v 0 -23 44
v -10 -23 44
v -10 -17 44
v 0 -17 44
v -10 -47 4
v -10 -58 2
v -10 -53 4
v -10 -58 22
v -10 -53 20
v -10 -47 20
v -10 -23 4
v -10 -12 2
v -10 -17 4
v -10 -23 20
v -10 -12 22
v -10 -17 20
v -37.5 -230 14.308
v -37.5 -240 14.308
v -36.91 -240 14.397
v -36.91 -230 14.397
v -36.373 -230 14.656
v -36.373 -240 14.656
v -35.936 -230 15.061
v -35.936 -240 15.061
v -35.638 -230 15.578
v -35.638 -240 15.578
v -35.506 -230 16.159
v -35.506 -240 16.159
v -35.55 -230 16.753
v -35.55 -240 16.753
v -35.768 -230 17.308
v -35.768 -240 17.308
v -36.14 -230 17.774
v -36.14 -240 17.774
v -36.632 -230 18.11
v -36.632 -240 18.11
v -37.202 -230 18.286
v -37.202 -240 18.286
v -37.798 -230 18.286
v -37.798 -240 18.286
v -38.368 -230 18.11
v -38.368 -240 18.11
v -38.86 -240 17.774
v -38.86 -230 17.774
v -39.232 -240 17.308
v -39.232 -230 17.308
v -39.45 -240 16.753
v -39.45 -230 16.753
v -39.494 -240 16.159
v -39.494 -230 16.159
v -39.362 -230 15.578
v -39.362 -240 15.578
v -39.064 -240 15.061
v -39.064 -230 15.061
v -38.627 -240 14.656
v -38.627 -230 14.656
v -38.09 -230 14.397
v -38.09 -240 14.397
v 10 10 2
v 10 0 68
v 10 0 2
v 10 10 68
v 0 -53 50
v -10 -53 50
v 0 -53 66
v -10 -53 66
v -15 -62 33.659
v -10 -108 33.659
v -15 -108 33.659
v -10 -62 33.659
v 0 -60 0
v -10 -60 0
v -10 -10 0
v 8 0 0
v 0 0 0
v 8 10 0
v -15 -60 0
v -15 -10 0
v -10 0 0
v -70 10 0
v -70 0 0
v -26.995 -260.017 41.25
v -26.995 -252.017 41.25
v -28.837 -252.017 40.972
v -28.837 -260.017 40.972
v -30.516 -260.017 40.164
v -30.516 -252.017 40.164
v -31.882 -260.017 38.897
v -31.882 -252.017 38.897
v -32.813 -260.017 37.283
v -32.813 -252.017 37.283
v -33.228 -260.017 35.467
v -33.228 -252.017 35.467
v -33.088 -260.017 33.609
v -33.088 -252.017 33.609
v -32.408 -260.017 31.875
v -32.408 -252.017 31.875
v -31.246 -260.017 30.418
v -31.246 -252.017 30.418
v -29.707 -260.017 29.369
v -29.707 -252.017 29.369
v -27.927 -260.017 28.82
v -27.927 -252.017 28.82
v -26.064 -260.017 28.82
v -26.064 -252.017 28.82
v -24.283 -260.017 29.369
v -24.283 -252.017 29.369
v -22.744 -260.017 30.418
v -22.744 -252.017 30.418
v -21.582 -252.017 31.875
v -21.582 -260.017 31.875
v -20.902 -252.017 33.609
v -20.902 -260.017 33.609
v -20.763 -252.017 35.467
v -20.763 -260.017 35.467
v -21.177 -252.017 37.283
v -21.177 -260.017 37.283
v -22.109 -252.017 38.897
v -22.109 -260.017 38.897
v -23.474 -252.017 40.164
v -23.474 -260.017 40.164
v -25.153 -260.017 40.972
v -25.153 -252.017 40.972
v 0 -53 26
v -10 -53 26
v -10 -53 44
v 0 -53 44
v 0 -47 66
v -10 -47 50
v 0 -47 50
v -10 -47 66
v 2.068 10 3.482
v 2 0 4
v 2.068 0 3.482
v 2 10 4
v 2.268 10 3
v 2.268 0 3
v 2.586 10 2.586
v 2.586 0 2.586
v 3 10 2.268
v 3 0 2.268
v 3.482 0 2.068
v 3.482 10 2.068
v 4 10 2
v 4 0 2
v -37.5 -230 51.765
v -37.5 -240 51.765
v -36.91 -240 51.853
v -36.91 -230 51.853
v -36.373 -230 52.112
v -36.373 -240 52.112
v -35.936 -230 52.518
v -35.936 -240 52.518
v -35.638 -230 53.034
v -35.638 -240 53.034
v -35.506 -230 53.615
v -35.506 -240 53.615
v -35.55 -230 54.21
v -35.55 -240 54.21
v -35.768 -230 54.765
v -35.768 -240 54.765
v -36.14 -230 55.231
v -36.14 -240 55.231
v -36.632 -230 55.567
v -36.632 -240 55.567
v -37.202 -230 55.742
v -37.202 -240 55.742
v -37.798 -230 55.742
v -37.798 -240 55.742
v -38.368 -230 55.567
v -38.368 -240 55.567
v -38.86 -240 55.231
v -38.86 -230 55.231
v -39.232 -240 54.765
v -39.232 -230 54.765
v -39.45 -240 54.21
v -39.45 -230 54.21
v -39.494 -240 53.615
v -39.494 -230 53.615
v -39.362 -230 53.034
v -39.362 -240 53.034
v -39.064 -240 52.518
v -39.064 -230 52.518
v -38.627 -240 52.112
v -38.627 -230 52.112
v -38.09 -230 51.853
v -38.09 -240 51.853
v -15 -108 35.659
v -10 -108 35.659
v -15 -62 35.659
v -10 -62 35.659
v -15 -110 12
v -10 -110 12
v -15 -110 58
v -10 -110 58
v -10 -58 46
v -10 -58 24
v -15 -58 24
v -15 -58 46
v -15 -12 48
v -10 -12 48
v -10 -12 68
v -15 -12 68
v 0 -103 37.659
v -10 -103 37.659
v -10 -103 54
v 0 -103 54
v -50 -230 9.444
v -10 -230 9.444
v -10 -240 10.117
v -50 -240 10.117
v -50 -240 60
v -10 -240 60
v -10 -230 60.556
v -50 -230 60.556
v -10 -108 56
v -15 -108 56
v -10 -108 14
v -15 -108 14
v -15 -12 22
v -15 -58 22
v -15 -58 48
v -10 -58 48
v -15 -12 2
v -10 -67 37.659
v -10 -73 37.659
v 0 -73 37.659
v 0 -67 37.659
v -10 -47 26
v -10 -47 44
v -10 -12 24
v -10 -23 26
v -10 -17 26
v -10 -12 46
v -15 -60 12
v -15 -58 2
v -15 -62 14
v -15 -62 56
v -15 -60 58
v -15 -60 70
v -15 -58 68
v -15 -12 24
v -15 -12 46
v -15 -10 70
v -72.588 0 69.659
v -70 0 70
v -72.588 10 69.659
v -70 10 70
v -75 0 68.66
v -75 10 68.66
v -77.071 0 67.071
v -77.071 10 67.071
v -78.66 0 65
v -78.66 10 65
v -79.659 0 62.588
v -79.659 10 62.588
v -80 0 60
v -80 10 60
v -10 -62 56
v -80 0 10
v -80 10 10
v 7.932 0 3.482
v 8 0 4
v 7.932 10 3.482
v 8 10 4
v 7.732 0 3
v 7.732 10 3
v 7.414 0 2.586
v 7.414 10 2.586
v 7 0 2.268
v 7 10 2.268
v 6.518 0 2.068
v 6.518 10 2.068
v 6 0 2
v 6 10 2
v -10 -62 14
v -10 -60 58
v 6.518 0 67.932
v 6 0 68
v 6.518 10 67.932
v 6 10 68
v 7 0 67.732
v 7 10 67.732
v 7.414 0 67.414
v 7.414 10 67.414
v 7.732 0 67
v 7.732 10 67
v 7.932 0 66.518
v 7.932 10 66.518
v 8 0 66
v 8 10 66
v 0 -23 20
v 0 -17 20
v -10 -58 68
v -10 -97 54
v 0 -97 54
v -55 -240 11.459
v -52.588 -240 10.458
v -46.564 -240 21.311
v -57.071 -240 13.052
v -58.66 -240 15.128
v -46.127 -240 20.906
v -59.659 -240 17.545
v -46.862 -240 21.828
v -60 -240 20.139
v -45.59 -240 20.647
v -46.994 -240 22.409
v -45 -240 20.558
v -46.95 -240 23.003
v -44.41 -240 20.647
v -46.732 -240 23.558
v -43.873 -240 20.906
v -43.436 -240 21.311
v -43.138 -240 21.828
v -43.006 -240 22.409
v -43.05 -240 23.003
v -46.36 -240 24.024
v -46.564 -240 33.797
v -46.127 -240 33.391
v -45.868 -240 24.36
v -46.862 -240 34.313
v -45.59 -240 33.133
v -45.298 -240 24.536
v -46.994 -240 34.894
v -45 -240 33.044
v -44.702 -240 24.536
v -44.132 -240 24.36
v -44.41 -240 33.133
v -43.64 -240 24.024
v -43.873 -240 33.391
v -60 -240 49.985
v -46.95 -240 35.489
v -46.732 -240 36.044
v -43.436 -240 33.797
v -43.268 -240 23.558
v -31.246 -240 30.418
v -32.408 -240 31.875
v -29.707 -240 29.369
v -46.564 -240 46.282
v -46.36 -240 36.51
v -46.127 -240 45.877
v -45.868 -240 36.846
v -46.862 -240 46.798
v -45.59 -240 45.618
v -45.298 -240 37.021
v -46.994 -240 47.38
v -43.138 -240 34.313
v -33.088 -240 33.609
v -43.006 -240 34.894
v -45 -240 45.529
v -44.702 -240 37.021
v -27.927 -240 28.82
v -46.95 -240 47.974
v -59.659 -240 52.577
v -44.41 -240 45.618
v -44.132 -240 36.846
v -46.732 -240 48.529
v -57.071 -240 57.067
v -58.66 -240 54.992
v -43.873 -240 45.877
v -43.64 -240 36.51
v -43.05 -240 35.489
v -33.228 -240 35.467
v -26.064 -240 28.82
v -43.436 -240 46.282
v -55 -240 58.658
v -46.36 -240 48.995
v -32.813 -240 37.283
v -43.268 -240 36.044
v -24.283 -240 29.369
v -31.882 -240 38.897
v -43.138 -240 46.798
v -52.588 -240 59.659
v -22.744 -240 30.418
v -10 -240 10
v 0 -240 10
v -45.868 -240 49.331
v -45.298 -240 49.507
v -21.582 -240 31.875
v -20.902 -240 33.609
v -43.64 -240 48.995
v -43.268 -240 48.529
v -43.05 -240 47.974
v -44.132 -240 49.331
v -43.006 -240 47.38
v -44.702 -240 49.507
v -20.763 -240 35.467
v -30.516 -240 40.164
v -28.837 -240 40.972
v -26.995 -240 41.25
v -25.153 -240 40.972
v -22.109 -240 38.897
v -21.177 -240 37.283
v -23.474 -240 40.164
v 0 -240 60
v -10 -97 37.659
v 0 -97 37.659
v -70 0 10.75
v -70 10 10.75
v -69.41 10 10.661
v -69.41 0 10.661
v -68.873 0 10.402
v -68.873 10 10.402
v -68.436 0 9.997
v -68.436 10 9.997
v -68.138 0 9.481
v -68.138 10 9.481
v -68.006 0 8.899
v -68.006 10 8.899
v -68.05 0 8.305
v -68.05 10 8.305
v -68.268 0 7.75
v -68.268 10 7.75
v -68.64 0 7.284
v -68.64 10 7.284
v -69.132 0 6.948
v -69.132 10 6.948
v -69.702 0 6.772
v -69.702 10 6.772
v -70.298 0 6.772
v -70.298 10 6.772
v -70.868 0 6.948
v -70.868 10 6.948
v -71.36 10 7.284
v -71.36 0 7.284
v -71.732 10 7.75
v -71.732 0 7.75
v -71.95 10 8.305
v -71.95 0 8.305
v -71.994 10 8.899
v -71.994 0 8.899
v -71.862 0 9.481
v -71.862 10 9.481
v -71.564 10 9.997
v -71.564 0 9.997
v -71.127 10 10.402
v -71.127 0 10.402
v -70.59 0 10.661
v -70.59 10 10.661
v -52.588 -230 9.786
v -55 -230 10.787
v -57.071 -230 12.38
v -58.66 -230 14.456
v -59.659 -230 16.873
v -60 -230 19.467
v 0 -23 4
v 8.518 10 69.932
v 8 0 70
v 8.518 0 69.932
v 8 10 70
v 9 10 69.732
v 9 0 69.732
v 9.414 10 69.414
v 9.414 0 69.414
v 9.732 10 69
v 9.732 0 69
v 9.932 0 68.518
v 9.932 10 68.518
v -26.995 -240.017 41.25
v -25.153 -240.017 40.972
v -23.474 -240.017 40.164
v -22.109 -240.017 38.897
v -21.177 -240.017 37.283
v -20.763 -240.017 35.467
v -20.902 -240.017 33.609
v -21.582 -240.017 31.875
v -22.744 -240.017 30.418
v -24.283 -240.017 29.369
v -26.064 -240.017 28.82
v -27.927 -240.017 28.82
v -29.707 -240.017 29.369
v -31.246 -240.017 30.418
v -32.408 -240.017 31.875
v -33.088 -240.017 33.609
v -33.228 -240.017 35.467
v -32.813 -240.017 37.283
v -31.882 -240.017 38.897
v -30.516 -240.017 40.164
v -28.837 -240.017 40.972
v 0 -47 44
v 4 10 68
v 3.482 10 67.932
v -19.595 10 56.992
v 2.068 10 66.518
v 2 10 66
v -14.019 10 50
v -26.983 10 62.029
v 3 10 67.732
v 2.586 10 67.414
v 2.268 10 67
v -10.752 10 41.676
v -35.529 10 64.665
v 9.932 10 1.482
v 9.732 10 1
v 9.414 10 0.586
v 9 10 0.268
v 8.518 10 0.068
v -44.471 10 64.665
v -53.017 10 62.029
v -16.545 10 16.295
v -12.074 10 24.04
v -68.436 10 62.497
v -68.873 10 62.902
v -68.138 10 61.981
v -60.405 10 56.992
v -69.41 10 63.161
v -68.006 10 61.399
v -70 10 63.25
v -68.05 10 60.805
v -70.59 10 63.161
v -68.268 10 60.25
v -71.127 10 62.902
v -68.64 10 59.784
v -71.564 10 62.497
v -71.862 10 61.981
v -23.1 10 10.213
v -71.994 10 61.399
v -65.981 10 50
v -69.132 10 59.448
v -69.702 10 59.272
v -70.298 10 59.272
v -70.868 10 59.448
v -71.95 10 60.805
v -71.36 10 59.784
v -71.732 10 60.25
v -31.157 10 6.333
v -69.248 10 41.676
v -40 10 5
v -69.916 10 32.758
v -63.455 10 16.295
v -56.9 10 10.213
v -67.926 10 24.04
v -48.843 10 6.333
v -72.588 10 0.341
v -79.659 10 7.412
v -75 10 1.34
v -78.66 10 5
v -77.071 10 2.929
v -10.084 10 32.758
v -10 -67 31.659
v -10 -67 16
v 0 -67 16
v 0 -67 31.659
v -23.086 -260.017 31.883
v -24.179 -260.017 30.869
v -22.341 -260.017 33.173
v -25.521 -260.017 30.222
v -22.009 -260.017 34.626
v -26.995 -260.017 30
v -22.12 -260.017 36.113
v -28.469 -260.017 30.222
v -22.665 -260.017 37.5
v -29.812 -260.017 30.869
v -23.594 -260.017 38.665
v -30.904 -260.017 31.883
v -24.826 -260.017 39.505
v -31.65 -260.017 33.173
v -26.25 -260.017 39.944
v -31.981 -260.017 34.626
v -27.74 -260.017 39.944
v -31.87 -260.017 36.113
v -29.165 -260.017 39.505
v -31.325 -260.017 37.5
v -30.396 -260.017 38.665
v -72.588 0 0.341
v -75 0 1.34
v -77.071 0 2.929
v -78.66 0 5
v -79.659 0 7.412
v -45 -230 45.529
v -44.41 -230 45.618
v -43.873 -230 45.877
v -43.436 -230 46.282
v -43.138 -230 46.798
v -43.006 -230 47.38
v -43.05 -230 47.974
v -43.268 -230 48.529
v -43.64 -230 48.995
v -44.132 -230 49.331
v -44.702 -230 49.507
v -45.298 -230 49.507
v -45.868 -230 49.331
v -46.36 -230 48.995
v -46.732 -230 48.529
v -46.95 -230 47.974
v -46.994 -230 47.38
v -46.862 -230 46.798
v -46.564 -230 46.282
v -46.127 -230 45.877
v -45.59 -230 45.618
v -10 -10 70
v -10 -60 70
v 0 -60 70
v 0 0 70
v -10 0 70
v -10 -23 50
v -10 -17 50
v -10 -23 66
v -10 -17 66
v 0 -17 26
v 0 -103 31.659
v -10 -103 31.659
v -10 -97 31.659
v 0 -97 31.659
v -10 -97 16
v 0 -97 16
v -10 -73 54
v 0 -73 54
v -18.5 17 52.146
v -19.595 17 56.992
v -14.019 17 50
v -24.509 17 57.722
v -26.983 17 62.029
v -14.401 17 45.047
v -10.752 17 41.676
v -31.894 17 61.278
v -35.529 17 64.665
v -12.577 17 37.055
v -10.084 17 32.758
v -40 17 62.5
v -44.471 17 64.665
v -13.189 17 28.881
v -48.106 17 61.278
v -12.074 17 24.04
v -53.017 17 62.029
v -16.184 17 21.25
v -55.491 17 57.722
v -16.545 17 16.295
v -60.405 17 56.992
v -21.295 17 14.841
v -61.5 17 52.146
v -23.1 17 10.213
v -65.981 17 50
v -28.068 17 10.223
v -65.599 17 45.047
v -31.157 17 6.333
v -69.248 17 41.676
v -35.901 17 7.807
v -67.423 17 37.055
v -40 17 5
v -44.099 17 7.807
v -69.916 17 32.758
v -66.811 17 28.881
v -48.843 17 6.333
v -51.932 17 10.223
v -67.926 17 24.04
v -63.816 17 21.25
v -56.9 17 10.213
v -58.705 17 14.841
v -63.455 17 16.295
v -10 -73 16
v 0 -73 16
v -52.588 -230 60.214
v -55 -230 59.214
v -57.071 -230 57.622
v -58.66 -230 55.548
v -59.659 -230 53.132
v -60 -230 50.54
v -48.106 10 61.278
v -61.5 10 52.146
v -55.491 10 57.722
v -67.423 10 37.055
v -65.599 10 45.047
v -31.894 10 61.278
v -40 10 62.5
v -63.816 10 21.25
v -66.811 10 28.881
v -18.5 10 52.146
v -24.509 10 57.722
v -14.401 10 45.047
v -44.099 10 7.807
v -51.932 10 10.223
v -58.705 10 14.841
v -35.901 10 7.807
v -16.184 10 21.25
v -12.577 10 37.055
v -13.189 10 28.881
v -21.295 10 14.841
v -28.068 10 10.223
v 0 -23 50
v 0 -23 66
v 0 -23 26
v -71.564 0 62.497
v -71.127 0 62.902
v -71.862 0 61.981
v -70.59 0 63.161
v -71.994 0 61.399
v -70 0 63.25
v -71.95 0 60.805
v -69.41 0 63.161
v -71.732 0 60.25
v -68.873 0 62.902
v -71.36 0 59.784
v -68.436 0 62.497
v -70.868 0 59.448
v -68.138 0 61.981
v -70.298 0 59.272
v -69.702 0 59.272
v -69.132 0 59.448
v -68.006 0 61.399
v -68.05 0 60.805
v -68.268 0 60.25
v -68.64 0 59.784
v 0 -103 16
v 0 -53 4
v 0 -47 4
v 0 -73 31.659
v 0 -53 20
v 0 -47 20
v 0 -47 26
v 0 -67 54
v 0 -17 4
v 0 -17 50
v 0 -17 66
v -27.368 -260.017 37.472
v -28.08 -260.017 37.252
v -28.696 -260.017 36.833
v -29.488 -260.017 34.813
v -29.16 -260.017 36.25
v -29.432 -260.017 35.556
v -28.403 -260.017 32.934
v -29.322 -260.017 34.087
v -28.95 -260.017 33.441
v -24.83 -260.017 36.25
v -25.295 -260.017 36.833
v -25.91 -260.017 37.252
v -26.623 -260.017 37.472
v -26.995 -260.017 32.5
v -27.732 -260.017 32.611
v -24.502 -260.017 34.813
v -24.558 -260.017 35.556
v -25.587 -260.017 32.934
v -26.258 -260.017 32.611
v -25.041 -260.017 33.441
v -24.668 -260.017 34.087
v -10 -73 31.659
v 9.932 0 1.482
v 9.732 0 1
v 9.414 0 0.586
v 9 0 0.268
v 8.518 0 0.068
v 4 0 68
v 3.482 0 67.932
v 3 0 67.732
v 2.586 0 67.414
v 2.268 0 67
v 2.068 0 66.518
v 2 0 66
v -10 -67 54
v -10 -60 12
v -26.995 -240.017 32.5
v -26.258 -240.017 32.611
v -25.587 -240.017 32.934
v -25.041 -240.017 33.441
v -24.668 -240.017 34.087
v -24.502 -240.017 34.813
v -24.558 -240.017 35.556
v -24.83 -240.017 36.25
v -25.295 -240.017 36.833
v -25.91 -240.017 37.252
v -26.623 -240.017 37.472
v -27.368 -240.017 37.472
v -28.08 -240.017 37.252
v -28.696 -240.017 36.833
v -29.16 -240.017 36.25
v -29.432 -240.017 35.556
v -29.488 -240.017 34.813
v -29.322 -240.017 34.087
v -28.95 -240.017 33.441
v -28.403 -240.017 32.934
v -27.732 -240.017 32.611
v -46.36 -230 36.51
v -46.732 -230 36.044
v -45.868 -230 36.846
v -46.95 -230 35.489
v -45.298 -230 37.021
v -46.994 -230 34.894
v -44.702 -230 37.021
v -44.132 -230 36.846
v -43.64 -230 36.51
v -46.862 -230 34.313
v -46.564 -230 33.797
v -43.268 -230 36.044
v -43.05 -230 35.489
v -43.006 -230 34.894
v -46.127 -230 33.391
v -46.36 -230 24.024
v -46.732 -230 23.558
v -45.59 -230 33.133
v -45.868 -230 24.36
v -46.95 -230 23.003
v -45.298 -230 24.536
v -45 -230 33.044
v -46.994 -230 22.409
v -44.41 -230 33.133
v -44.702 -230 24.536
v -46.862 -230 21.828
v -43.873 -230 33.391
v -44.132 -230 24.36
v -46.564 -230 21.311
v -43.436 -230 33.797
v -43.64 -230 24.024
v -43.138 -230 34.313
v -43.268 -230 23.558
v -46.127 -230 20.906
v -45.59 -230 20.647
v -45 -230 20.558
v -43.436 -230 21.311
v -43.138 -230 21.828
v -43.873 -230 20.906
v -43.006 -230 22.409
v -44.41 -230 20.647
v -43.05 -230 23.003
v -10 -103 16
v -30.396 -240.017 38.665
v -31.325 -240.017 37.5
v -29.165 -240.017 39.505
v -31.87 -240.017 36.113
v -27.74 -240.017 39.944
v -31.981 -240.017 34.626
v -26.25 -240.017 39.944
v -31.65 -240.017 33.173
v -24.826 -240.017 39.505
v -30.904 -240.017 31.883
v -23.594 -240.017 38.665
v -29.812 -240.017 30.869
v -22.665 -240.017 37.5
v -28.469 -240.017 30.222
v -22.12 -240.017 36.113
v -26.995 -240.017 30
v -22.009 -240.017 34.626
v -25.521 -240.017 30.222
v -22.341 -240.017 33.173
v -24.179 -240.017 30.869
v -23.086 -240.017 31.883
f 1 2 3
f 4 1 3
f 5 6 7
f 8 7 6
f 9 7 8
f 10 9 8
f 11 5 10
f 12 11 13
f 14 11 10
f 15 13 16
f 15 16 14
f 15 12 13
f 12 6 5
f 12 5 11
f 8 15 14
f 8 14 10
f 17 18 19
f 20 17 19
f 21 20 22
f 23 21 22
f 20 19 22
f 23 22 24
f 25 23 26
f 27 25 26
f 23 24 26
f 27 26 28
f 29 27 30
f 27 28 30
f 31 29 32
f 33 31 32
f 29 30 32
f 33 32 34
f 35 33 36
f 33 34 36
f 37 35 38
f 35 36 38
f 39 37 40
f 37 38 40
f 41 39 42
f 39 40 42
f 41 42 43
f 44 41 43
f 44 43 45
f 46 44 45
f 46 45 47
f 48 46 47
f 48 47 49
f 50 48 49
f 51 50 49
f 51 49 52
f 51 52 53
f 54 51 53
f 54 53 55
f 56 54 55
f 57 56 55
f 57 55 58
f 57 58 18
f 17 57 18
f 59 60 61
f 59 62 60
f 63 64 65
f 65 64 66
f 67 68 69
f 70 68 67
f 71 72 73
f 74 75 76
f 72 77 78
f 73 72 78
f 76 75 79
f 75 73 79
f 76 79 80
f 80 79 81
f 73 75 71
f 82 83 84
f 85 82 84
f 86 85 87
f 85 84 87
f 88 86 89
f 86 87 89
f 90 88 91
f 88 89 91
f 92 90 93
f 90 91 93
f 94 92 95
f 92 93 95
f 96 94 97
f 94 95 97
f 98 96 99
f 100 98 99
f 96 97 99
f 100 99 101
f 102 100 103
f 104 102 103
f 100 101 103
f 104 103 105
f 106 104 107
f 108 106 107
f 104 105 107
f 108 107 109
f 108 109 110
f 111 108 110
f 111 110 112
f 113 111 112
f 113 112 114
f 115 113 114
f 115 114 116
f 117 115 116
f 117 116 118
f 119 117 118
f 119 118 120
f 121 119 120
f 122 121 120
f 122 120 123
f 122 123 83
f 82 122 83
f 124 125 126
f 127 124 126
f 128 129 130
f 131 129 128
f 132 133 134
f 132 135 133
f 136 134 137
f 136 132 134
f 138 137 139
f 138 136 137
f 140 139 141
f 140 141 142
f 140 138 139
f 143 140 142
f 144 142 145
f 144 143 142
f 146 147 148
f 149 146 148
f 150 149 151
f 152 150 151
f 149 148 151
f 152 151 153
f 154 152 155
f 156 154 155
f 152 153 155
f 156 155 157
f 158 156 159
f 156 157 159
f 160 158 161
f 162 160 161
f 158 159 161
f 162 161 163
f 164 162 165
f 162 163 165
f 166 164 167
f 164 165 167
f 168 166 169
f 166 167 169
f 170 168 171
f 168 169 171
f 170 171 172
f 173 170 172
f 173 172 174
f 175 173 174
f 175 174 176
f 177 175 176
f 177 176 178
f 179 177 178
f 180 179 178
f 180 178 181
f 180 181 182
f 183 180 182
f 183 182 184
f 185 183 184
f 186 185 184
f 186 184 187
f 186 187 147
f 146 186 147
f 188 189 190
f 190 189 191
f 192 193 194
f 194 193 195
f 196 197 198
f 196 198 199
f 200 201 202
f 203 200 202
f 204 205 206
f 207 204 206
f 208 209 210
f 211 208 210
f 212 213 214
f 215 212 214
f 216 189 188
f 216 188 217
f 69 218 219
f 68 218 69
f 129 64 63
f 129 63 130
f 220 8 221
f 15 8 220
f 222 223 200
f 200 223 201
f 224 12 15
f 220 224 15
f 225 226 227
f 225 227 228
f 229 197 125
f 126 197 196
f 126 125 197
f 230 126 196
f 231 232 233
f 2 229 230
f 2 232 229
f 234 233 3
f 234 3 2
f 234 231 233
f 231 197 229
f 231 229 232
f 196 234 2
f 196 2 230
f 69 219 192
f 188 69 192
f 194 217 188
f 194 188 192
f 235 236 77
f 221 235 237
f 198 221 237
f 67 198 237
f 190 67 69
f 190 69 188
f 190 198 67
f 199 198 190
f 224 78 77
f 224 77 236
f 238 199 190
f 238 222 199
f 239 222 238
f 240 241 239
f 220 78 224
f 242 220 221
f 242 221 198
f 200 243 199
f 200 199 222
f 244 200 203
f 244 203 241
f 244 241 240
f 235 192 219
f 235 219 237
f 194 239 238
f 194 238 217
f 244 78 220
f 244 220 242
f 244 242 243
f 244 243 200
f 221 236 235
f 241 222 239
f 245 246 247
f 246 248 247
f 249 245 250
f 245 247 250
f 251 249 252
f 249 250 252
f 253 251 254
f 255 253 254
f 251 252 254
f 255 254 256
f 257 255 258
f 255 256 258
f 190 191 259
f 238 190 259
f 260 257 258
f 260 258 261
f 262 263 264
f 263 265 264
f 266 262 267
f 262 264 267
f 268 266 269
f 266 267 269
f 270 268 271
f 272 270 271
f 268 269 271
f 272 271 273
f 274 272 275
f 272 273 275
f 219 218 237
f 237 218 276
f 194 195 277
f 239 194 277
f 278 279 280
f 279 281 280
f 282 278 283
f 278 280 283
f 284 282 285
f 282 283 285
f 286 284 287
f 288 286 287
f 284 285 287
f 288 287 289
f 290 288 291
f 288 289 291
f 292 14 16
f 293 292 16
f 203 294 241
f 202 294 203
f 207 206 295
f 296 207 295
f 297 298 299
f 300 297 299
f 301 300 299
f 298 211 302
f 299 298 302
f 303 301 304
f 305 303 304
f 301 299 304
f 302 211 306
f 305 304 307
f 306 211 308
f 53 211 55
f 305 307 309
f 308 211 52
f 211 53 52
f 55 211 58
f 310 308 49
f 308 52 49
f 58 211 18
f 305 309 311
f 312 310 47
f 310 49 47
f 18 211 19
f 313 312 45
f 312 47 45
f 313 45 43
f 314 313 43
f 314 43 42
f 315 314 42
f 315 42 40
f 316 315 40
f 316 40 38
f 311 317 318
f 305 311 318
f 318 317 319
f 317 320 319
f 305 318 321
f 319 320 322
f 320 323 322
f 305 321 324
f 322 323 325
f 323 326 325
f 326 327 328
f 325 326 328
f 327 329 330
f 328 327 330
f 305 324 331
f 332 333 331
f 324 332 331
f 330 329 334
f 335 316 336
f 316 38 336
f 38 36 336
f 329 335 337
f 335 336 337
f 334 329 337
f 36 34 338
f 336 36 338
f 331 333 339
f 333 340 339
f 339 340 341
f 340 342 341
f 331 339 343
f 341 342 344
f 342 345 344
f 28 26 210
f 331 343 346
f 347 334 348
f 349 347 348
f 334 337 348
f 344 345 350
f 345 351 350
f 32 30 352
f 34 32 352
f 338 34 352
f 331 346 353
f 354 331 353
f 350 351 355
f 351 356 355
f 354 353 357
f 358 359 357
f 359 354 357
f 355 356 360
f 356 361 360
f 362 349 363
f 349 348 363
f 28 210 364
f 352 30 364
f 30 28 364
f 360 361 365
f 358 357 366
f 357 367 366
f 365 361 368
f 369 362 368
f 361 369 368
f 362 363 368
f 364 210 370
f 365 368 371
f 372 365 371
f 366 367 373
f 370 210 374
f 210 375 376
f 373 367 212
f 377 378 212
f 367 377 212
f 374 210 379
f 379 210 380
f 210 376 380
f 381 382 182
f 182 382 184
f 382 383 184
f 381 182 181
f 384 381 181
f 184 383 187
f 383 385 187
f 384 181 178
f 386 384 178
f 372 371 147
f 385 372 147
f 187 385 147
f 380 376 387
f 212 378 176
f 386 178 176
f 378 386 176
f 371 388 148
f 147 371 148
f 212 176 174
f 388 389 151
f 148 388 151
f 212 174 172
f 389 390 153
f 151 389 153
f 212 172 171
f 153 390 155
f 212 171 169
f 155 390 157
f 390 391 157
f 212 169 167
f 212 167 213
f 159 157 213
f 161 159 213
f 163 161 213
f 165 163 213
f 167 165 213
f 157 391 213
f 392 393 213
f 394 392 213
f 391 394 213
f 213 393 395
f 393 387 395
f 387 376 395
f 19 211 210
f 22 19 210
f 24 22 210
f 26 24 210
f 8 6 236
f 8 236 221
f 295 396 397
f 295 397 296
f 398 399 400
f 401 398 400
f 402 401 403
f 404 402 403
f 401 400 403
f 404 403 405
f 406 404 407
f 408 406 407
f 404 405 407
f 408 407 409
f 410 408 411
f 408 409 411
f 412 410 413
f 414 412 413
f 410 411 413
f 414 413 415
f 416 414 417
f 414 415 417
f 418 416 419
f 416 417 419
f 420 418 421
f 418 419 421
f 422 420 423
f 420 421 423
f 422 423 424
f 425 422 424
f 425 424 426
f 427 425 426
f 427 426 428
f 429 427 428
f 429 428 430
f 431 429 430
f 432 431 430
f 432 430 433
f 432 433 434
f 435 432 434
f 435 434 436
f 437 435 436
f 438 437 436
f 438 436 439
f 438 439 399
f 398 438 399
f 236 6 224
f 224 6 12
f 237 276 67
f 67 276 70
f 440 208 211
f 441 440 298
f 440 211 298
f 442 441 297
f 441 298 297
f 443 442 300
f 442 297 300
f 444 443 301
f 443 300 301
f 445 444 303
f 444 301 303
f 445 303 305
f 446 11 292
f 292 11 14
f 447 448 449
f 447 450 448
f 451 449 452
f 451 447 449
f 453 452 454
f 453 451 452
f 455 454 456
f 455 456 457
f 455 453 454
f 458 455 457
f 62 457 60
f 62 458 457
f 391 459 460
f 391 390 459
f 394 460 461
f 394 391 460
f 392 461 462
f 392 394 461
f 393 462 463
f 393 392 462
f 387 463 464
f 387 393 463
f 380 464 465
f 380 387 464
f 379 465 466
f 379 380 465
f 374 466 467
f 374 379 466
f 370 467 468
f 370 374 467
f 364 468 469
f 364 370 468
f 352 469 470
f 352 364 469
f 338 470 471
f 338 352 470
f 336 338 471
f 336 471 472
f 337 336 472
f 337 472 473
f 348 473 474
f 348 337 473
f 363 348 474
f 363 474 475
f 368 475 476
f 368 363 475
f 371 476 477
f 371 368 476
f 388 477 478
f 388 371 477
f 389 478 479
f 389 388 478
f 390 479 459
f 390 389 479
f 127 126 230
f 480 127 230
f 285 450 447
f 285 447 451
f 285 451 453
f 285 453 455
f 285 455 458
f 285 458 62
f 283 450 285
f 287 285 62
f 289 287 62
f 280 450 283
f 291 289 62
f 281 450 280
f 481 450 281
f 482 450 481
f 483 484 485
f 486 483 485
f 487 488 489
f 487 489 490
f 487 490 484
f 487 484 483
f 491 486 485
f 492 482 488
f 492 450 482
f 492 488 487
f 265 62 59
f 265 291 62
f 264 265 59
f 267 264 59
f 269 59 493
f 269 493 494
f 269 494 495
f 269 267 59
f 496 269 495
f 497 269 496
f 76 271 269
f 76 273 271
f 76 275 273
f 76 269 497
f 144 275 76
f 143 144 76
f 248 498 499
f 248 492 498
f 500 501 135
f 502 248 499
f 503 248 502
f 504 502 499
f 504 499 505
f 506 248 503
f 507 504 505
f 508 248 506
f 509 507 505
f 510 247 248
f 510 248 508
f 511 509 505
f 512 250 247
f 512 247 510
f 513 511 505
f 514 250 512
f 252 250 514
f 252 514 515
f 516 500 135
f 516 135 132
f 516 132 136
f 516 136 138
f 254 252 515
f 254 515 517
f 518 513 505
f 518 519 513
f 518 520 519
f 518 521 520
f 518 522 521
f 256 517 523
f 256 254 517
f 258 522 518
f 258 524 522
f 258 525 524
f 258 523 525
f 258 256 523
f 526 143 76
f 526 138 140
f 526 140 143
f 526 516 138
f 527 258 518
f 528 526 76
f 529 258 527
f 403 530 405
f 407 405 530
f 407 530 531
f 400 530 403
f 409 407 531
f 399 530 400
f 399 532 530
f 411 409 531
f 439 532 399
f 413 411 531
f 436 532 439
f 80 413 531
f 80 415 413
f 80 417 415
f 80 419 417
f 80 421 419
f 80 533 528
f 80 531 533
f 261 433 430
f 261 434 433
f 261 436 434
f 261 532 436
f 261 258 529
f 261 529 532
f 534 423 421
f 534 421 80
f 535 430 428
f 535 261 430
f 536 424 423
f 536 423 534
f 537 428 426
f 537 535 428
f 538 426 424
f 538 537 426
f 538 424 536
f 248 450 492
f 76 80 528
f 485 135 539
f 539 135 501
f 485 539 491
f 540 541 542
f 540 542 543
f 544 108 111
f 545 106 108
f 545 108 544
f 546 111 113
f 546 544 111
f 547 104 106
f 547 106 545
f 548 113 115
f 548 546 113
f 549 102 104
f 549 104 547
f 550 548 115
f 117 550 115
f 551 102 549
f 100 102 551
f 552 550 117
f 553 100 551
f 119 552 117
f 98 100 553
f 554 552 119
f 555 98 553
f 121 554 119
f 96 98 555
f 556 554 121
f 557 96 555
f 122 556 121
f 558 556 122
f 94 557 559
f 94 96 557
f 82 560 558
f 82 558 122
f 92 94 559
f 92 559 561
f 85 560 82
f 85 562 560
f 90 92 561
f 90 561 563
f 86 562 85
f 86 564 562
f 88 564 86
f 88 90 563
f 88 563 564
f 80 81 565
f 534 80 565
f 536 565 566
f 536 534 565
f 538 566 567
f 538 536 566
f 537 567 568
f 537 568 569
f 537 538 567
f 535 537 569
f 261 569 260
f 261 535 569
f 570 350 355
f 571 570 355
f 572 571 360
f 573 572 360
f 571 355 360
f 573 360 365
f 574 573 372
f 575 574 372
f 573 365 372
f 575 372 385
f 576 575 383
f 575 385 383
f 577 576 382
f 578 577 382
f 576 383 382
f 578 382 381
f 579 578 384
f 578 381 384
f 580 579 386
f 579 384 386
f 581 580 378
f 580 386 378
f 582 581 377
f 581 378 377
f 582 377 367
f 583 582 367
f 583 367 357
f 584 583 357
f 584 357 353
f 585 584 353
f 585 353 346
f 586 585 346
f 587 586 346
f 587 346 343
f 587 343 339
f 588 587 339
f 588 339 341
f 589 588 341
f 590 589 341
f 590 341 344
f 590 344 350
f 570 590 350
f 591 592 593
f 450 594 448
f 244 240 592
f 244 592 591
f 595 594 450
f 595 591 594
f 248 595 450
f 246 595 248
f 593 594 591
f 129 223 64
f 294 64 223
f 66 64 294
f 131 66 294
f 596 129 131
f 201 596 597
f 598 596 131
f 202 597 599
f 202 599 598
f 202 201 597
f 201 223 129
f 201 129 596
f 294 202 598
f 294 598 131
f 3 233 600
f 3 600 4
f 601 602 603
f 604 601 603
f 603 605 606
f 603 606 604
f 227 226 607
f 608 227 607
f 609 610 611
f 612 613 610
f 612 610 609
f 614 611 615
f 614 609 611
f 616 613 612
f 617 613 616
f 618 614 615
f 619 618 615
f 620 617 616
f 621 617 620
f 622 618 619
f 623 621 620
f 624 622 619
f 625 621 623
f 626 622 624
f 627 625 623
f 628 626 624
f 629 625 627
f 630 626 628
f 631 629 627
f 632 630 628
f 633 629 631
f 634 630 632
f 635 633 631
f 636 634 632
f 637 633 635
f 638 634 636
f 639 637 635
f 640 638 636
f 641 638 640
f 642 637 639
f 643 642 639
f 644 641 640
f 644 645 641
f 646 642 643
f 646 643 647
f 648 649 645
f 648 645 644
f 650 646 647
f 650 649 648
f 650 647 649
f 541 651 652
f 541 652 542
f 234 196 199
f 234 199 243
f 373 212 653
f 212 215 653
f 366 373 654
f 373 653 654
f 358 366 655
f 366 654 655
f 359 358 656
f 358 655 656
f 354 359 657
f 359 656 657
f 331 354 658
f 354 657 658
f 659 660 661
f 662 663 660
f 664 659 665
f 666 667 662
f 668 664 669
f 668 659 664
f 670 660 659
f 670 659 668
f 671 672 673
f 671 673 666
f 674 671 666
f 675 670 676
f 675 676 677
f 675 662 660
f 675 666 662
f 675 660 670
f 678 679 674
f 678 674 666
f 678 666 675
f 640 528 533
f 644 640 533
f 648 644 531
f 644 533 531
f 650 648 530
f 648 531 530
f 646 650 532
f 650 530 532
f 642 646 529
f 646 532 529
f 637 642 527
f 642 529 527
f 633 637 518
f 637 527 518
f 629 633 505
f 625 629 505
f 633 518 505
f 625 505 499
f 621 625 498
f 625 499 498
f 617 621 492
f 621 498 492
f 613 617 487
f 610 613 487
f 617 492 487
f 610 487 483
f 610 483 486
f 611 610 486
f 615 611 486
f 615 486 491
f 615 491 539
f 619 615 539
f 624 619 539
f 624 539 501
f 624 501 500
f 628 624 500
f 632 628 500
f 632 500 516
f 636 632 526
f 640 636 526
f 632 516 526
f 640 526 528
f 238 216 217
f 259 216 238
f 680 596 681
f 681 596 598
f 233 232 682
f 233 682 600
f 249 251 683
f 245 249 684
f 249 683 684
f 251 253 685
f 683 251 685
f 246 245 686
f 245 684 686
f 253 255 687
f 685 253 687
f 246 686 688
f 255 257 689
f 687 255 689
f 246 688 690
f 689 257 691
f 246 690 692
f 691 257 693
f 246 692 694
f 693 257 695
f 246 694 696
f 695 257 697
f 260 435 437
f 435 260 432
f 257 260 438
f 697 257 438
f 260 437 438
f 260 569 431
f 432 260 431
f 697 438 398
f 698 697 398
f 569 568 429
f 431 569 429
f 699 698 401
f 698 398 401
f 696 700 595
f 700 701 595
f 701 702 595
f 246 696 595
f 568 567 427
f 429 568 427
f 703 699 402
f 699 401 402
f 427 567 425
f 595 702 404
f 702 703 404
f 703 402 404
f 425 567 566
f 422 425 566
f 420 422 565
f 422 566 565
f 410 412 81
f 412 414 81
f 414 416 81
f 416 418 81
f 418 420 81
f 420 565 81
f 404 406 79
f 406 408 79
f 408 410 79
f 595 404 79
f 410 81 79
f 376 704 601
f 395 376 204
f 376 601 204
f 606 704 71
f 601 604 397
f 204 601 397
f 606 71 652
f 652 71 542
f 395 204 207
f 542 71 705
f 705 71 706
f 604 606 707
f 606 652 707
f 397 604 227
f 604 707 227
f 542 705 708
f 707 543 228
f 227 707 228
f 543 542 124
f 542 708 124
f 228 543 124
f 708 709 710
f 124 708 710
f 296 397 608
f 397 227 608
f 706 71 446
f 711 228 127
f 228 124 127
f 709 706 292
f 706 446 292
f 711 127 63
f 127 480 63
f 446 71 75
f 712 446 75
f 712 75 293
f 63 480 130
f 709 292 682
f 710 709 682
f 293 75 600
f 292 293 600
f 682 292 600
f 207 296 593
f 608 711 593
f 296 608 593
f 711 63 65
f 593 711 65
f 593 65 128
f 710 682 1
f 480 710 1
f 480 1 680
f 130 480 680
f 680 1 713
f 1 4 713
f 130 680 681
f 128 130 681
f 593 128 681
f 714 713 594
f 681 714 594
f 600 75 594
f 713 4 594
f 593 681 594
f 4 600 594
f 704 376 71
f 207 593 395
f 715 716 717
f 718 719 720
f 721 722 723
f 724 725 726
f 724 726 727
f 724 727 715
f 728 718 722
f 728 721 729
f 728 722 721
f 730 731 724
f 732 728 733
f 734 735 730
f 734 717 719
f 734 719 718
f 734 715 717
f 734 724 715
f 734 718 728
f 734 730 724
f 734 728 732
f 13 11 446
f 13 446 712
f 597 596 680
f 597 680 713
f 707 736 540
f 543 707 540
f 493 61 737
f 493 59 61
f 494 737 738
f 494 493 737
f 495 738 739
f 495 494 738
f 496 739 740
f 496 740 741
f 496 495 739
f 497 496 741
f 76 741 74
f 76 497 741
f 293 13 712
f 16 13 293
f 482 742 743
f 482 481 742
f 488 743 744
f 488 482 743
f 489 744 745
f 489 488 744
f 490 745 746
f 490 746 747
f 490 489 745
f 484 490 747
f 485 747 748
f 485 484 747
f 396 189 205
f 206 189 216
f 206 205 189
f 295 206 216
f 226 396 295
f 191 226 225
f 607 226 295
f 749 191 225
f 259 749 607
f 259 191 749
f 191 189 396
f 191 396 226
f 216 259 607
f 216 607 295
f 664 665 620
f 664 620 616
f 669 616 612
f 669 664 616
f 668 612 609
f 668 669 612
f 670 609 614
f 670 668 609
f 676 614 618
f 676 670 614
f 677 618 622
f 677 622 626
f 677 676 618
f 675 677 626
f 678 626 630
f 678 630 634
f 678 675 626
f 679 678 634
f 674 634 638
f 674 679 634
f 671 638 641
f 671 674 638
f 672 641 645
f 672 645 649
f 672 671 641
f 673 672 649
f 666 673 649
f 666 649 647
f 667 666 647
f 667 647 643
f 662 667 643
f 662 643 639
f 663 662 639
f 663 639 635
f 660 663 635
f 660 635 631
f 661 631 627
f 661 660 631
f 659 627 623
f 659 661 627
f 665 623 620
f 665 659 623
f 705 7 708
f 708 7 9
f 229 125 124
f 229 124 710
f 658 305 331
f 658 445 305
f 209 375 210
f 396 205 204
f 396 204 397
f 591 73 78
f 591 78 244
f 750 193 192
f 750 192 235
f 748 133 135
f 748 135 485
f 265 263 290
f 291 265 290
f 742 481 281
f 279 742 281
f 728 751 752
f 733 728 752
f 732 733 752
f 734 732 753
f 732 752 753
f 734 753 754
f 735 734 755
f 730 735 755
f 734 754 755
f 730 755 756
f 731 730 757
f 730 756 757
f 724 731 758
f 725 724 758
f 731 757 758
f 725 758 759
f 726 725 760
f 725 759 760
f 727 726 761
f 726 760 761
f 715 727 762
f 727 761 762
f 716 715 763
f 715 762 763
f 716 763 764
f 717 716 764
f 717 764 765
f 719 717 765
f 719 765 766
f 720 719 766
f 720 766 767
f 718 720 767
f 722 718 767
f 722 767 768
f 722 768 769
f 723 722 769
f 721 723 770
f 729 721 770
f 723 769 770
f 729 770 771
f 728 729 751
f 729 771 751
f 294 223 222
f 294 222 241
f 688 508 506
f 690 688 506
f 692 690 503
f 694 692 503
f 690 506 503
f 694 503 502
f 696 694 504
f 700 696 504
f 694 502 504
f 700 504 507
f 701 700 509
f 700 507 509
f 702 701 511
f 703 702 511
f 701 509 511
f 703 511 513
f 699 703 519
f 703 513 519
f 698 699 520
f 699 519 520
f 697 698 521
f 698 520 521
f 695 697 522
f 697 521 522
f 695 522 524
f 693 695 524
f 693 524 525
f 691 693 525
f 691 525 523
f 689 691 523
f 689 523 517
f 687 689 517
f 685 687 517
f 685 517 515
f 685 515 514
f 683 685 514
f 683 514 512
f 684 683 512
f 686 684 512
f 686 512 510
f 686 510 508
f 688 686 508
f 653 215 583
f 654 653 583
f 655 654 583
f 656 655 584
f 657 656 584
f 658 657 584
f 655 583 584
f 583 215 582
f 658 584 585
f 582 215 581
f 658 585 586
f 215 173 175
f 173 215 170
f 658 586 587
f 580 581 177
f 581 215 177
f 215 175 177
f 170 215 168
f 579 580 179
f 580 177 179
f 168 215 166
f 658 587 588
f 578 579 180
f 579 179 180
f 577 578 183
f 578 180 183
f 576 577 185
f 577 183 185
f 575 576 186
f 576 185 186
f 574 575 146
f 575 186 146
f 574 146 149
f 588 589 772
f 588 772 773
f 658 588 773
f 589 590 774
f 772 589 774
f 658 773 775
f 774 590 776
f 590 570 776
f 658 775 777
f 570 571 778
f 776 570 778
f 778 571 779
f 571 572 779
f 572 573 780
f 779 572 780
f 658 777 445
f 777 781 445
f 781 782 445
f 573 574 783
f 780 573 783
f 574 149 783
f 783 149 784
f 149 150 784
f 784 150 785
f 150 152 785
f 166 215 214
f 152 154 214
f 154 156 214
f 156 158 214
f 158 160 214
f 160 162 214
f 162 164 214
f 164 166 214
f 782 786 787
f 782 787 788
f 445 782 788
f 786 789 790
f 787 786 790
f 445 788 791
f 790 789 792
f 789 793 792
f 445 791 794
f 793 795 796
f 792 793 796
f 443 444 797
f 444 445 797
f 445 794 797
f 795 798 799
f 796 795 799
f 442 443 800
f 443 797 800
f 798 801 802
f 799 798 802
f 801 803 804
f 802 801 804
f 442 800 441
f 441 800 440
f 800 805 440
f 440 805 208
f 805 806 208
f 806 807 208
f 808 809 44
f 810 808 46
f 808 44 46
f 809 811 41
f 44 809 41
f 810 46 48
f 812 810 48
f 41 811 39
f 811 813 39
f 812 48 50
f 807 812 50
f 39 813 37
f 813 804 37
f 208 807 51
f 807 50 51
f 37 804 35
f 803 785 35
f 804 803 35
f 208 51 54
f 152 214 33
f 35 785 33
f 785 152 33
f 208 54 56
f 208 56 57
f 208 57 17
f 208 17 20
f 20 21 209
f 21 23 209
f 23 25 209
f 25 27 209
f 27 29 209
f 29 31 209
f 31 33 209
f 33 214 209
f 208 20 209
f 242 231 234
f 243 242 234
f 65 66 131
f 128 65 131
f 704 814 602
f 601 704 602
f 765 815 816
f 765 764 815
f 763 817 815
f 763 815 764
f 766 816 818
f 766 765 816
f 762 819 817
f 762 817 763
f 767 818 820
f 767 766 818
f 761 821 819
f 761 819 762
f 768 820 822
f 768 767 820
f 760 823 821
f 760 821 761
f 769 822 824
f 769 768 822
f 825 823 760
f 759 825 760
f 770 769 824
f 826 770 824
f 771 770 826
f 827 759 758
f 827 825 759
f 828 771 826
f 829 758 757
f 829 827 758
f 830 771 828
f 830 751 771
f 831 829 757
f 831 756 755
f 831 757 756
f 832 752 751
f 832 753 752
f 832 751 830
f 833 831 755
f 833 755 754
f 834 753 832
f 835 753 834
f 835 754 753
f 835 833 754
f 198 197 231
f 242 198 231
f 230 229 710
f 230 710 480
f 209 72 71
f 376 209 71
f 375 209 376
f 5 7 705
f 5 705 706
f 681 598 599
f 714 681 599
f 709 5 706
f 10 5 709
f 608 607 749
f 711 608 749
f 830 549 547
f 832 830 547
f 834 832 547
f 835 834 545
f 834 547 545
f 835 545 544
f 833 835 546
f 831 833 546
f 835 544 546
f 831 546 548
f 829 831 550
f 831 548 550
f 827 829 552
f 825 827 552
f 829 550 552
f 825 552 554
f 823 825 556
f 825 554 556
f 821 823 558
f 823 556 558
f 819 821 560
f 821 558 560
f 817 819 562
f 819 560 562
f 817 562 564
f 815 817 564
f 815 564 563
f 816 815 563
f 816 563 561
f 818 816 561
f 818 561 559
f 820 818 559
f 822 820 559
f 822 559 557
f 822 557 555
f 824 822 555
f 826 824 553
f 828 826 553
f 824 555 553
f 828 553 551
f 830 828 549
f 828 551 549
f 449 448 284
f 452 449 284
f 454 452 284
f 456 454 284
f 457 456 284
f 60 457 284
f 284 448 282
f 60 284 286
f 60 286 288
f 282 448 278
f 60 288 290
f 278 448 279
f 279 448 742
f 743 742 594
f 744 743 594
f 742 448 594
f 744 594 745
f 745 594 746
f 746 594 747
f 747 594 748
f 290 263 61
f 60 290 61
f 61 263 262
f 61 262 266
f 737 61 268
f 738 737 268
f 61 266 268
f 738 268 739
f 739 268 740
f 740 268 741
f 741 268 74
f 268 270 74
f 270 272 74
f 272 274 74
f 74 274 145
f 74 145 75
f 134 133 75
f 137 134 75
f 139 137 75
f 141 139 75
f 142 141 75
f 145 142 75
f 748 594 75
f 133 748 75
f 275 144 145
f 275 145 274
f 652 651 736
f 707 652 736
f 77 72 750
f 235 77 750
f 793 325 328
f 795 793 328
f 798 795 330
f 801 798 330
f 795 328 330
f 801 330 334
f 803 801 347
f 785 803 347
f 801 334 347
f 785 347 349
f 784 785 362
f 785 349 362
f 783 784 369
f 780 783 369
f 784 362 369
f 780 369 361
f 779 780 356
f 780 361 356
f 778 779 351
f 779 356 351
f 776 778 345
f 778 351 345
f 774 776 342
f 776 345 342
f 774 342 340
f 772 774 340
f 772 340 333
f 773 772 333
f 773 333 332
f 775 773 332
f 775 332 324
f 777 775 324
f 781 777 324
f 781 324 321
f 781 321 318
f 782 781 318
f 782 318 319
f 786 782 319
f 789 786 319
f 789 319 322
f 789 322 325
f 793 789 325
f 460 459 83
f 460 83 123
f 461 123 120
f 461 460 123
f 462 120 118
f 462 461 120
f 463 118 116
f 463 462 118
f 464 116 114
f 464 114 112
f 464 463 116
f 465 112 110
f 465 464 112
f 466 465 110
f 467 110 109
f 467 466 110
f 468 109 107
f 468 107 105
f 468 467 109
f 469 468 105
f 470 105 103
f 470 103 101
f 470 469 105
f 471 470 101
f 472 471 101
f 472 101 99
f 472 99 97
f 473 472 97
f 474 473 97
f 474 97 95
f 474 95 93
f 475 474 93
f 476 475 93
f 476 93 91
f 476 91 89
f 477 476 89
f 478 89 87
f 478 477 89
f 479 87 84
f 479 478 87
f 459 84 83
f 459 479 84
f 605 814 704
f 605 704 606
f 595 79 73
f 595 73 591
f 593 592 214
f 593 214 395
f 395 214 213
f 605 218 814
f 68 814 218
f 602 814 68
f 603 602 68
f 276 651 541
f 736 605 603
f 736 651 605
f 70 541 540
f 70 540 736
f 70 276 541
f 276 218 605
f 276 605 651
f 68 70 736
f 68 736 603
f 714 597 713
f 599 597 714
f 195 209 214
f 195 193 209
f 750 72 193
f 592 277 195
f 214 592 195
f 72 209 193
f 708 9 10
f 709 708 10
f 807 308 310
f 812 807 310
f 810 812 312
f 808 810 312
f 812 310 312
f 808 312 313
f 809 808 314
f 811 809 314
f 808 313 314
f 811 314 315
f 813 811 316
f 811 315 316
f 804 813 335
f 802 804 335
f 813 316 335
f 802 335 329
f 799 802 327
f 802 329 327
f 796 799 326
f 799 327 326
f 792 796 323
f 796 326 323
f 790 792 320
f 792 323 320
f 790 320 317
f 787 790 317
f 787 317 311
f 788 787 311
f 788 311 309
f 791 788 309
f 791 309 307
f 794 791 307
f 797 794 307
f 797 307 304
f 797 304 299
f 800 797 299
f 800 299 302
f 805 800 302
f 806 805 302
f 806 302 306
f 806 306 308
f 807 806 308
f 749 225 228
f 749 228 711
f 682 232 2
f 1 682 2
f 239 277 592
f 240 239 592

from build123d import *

# Parameters (mm, degrees)
SKETCH1_W                 = 80
SKETCH1_H                 = 70
BOSS_EXTRUDE1_DEPTH       = 10
SKETCH2_W                 = 10
SKETCH2_H                 = 70
BOSS_EXTRUDE2_DEPTH       = 450
SKETCH3_R                 = 30
SKETCH3_R_2               = 27.5
BOSS_EXTRUDE3_DEPTH       = 7
SKETCH6_R                 = 2
CUT_EXTRUDE3_DEPTH        = 27
SKETCH7_W                 = 70
SKETCH7_H                 = 210
CUT_EXTRUDE4_DEPTH        = 27
CUT_EXTRUDE5_DEPTH        = 70
BOSS_EXTRUDE5_DEPTH       = 50
SKETCH12_R                = 10
SKETCH12_R_2              = 7.5
SKETCH12_R_3              = 2.5
BOSS_EXTRUDE6_DEPTH       = 25
SKETCH13_R                = 2
CUT_EXTRUDE6_DEPTH        = 25
SKETCH14_W                = 24
SKETCH14_H                = 50
SKETCH14_W_2              = 20
SKETCH14_H_2              = 46
BOSS_EXTRUDE7_DEPTH       = 5
SKETCH15_W                = 24
SKETCH15_H                = 50
SKETCH15_W_2              = 20
SKETCH15_H_2              = 46
BOSS_EXTRUDE8_DEPTH       = 5
SKETCH16_W                = 22
SKETCH16_H                = 2
BOSS_EXTRUDE9_DEPTH       = 5
SKETCH17_W                = 46
SKETCH17_H                = 50
SKETCH17_W_2              = 19.659007001
SKETCH17_H_2              = 46
SKETCH17_W_3              = 20.340992999
BOSS_EXTRUDE10_DEPTH      = 5
SKETCH18_W                = 16
SKETCH18_H                = 6
SKETCH18_W_2              = 18
CUT_EXTRUDE8_DEPTH        = 10
SKETCH19_W                = 15.659007001
SKETCH19_H                = 6
SKETCH19_W_2              = 16.340992999
CUT_EXTRUDE9_DEPTH        = 10
FILLET1_R                 = 10
FILLET2_R                 = 10
SKETCH20_W                = 70
SKETCH20_H                = 10
BOSS_EXTRUDE11_DEPTH      = 10
SKETCH21_W                = 6
SKETCH21_H                = 66
CUT_EXTRUDE10_DEPTH       = 10
FILLET3_R                 = 2
FILLET4_R                 = 2
FILLET5_R                 = 2
SKETCH23_W                = 25.167549862
SKETCH23_H                = 25.727851888
CUT_EXTRUDE12_DEPTH       = 116
SKETCH25_R                = 6.25
BOSS_EXTRUDE12_DEPTH      = 15
SKETCH26_W                = 12.5
SKETCH26_H                = 21
SKETCH26_H_2              = 4
BOSS_EXTRUDE13_DEPTH      = 10
SKETCH27_W                = 12.5
SKETCH27_H                = 5
BOSS_EXTRUDE15_DEPTH      = 12.5
FILLET8_R                 = 6.25
CUT_EXTRUDE14_DEPTH       = 52.5
CUT_EXTRUDE14_DEPTH_BACK  = 12.5
SKETCH29_R                = 2.5
FILLET9_R                 = 6.25
SKETCH30_W                = 23.435939186
SKETCH30_H                = 31.122826337
CUT_EXTRUDE15_DEPTH       = 78
BOSS_EXTRUDE16_DEPTH      = 8
BOSS_EXTRUDE16_DEPTH_BACK = 12
SKETCH31_R                = 6.25
SKETCH32_R                = 5
CUT_EXTRUDE16_DEPTH       = 20
SKETCH33_R                = 2.5
BOSS_EXTRUDE17_DEPTH      = 20


# Some blends are built 0.0001 mm under size
with BuildPart() as part:
    # Sketch1 → Boss-Extrude1 (new body)
    with BuildSketch(Plane(origin=(0, 0, 0), x_dir=(1, 0, 0), z_dir=(0, 1, 0))):
        with Locations((-40, -35)):
            Rectangle(SKETCH1_W, SKETCH1_H)
    extrude(amount=BOSS_EXTRUDE1_DEPTH)

    # Sketch2 → Boss-Extrude2 (add)
    with BuildSketch(Plane.XZ):
        with Locations((-5, 35)):
            Rectangle(SKETCH2_W, SKETCH2_H)
    extrude(amount=BOSS_EXTRUDE2_DEPTH)

    # Sketch3 → Boss-Extrude3 (add)
    with BuildSketch(Plane(origin=(0, 10, 0), x_dir=(1, 0, 0), z_dir=(0, 1, 0))):
        with Locations(Location((-40, -35, 0), (0, 0, 90))):
            Circle(SKETCH3_R)
        with Locations(Location((-40, -35, 0), (0, 0, 270))):
            Circle(SKETCH3_R_2, mode=Mode.SUBTRACT)
    extrude(amount=BOSS_EXTRUDE3_DEPTH)

    # Sketch6 → Cut-Extrude3 (cut)
    with BuildSketch(Plane(origin=(0, 10, 0), x_dir=(1, 0, 0), z_dir=(0, 1, 0))):
        with Locations(Location((-70, -61.25, 0), (0, 0, 270))):
            Circle(SKETCH6_R)
        with Locations(Location((-70, -8.75, 0), (0, 0, 270))):
            Circle(SKETCH6_R)
    extrude(amount=-CUT_EXTRUDE3_DEPTH, mode=Mode.SUBTRACT)

    # Sketch7 → Cut-Extrude4 (cut)
    with BuildSketch(Plane.ZY.offset(10)):
        with Locations((35, -345)):
            Rectangle(SKETCH7_W, SKETCH7_H)
    extrude(amount=-CUT_EXTRUDE4_DEPTH, mode=Mode.SUBTRACT)

    # Sketch10 → Cut-Extrude5 (cut)
    with BuildSketch(Plane.ZY.offset(10)):
        Polygon((0, -60), (10, -240), (0, -240), align=None)
        Polygon((70, -60), (60, -240), (70, -240), align=None)
    extrude(amount=-CUT_EXTRUDE5_DEPTH, mode=Mode.SUBTRACT)

    # Sketch11 → Boss-Extrude5 (add)
    with BuildSketch(Plane.ZY.offset(10)):
        Polygon((10.116578541, -240), (60, -240), (60.555555556, -230), (9.444444444, -230), align=None)
    extrude(amount=BOSS_EXTRUDE5_DEPTH)

    # Sketch12 → Boss-Extrude6 (add)
    # profile 1 of 2: a face of its own
    with BuildSketch(Plane.XZ.offset(240)):
        with Locations(Location((-30, 35, 0), (0, 0, 90))):
            Circle(SKETCH12_R)
        with Locations(Location((-30, 35, 0), (0, 0, 270))):
            Circle(SKETCH12_R_2, mode=Mode.SUBTRACT)
    # profile 2 of 2: a face of its own
    with BuildSketch(Plane.XZ.offset(240)):
        with Locations(Location((-30, 35, 0), (0, 0, 90))):
            Circle(SKETCH12_R_3)
    extrude(amount=BOSS_EXTRUDE6_DEPTH)

    # Sketch13 → Cut-Extrude6 (cut)
    with BuildSketch(Plane(origin=(0, -240, 0), x_dir=(-1, 0, 0), z_dir=(0, -1, 0))):
        with Locations(Location((45, -47.529144635, 0), (0, 0, 90))):
            Circle(SKETCH13_R)
        with Locations(Location((45, -22.558289271, 0), (0, 0, 90))):
            Circle(SKETCH13_R)
        with Locations(Location((45, -35.043716953, 0), (0, 0, 90))):
            Circle(SKETCH13_R)
        with Locations(Location((37.5, -53.764572318, 0), (0, 0, 90))):
            Circle(SKETCH13_R)
        with Locations(Location((37.5, -16.308289271, 0), (0, 0, 90))):
            Circle(SKETCH13_R)
    extrude(amount=-CUT_EXTRUDE6_DEPTH, mode=Mode.SUBTRACT)

    # Sketch14 → Boss-Extrude7 (add)
    with BuildSketch(Plane.ZY.offset(10)):
        with Locations((12, -35)):
            Rectangle(SKETCH14_W, SKETCH14_H)
        with Locations((12, -35)):
            Rectangle(SKETCH14_W_2, SKETCH14_H_2, mode=Mode.SUBTRACT)
    extrude(amount=BOSS_EXTRUDE7_DEPTH)

    # Sketch15 → Boss-Extrude8 (add)
    with BuildSketch(Plane.ZY.offset(10)):
        with Locations((58, -35)):
            Rectangle(SKETCH15_W, SKETCH15_H)
        with Locations((58, -35)):
            Rectangle(SKETCH15_W_2, SKETCH15_H_2, mode=Mode.SUBTRACT)
    extrude(amount=BOSS_EXTRUDE8_DEPTH)

    # Sketch16 → Boss-Extrude9 (add)
    with BuildSketch(Plane.ZY.offset(10)):
        with Locations((35, -11)):
            Rectangle(SKETCH16_W, SKETCH16_H)
        with Locations((35, -59)):
            Rectangle(SKETCH16_W, SKETCH16_H)
    extrude(amount=BOSS_EXTRUDE9_DEPTH)

    # Sketch17 → Boss-Extrude10 (add)
    with BuildSketch(Plane.ZY.offset(10)):
        with Locations((35, -85)):
            Rectangle(SKETCH17_W, SKETCH17_H)
        with Locations((23.8295035, -85)):
            Rectangle(SKETCH17_W_2, SKETCH17_H_2, mode=Mode.SUBTRACT)
        with Locations((45.8295035, -85)):
            Rectangle(SKETCH17_W_3, SKETCH17_H_2, mode=Mode.SUBTRACT)
    extrude(amount=BOSS_EXTRUDE10_DEPTH)

    # Sketch18 → Cut-Extrude8 (cut)
    with BuildSketch(Plane.ZY.offset(10)):
        with Locations((12, -20)):
            Rectangle(SKETCH18_W, SKETCH18_H)
        with Locations((35, -20)):
            Rectangle(SKETCH18_W_2, SKETCH18_H)
        with Locations((58, -20)):
            Rectangle(SKETCH18_W, SKETCH18_H)
        with Locations((12, -50)):
            Rectangle(SKETCH18_W, SKETCH18_H)
        with Locations((35, -50)):
            Rectangle(SKETCH18_W_2, SKETCH18_H)
        with Locations((58, -50)):
            Rectangle(SKETCH18_W, SKETCH18_H)
    extrude(amount=-CUT_EXTRUDE8_DEPTH, mode=Mode.SUBTRACT)

    # Sketch19 → Cut-Extrude9 (cut)
    with BuildSketch(Plane.ZY.offset(10)):
        with Locations((23.829503501, -70)):
            Rectangle(SKETCH19_W, SKETCH19_H)
        with Locations((23.829503501, -100)):
            Rectangle(SKETCH19_W, SKETCH19_H)
        with Locations((45.8295035, -70)):
            Rectangle(SKETCH19_W_2, SKETCH19_H)
        with Locations((45.8295035, -100)):
            Rectangle(SKETCH19_W_2, SKETCH19_H)
    extrude(amount=-CUT_EXTRUDE9_DEPTH, mode=Mode.SUBTRACT)

    # Fillet1
    fillet1_edges = [part.edges().sort_by_distance(p)[0] for p in [
        (-80, 5, 0),
        (-80, 5, 70),
    ]]
    fillet(fillet1_edges, radius=FILLET1_R)

    # Fillet2
    fillet2_edges = [part.edges().sort_by_distance(p)[0] for p in [
        (-60, -235, 9.780511493),
        (-60, -235, 60.277777778),
    ]]
    fillet(fillet2_edges, radius=FILLET2_R)

    # Sketch20 → Boss-Extrude11 (add)
    with BuildSketch(Plane(origin=(0, 0, 0), x_dir=(0, 0, -1), z_dir=(1, 0, 0))):
        with Locations((-35, 5)):
            Rectangle(SKETCH20_W, SKETCH20_H)
    extrude(amount=BOSS_EXTRUDE11_DEPTH)

    # Sketch21 → Cut-Extrude10 (cut)
    with BuildSketch(Plane.XZ):
        with Locations((5, 35)):
            Rectangle(SKETCH21_W, SKETCH21_H)
    extrude(amount=-CUT_EXTRUDE10_DEPTH, mode=Mode.SUBTRACT)

    # Fillet3
    fillet3_edges = [part.edges().sort_by_distance(p)[0] for p in [
        (10, 5, 70),
        (10, 5, 0),
    ]]
    fillet(fillet3_edges, radius=FILLET3_R)

    # Fillet4
    fillet4_edges = [part.edges().sort_by_distance(p)[0] for p in [
        (8, 5, 68),
        (8, 5, 2),
    ]]
    fillet(fillet4_edges, radius=FILLET4_R)

    # Fillet5
    fillet5_edges = [part.edges().sort_by_distance(p)[0] for p in [
        (2, 5, 2),
        (2, 5, 68),
    ]]
    fillet(fillet5_edges, radius=FILLET5_R)

    # Sketch23 → Cut-Extrude12 (cut)
    with BuildSketch(Plane.XZ.offset(240)):
        with Locations((-28.923795104, 37.128742303)):
            Rectangle(SKETCH23_W, SKETCH23_H)
    extrude(amount=CUT_EXTRUDE12_DEPTH, mode=Mode.SUBTRACT)

    # Sketch25 → Boss-Extrude12 (add)
    with BuildSketch(Plane(origin=(0, -240, 0), x_dir=(-1, 0, 0), z_dir=(0, -1, 0))):
        with Locations(Location((26.99513388, -35, 0), (0, 0, 270))):
            Circle(SKETCH25_R)
    extrude(amount=BOSS_EXTRUDE12_DEPTH)

    # Sketch26 → Boss-Extrude13 (add)
    with BuildSketch(Plane(origin=(0, -255, 0), x_dir=(-1, 0, 0), z_dir=(0, -1, 0))):
        with Locations((26.99513388, -45.5)):
            Rectangle(SKETCH26_W, SKETCH26_H)
        with Locations((26.99513388, -24.5)):
            Rectangle(SKETCH26_W, SKETCH26_H)
        with Locations((26.99513388, -12)):
            Rectangle(SKETCH26_W, SKETCH26_H_2)
        with Locations((26.99513388, -58)):
            Rectangle(SKETCH26_W, SKETCH26_H_2)
    extrude(amount=BOSS_EXTRUDE13_DEPTH)

    # Sketch27 → Boss-Extrude15 (add)
    with BuildSketch(Plane.XZ.offset(265)):
        with Locations((-26.99513388, 12.5)):
            Rectangle(SKETCH27_W, SKETCH27_H)
        with Locations((-26.99513388, 57.5)):
            Rectangle(SKETCH27_W, SKETCH27_H)
    extrude(amount=BOSS_EXTRUDE15_DEPTH)

    # Fillet8
    fillet8_edges = [part.edges().sort_by_distance(p)[0] for p in [
        (-20.74513388, -277.5, 57.5),
        (-33.24513388, -277.5, 57.5),
        (-20.74513388, -277.5, 12.5),
        (-33.24513388, -277.5, 12.5),
    ]]
    fillet(fillet8_edges, radius=FILLET8_R - 0.0001)  # a hair under: the kernel refuses the full size

    # Sketch29 → Cut-Extrude14 (cut, two sides: drawn at the far end of the back side and taken through both)
    with BuildSketch(Plane(origin=(0, 0, 55), x_dir=(-1, 0, 0), z_dir=(0, 0, -1)).offset(-CUT_EXTRUDE14_DEPTH_BACK)):
        with Locations(Location((26.99513388, -271.25, 0), (0, 0, 180))):
            Circle(SKETCH29_R)
    extrude(amount=CUT_EXTRUDE14_DEPTH + CUT_EXTRUDE14_DEPTH_BACK, mode=Mode.SUBTRACT)

    # Fillet9
    # the kernel refuses this fillet: 6.25 mm, written as the material it takes off along each edge
    with BuildSketch(Plane(origin=(-20.74513388, -255, 35), x_dir=(0, -1, 0), z_dir=(0, 0, 1))) as fillet9_piece_1_section:
        with BuildLine():
            CenterArc((FILLET9_R, -FILLET9_R), FILLET9_R, 90, 90)
            Line((0, -FILLET9_R), (0, 0))
            Line((0, 0), (FILLET9_R, 0))
        make_face()
    fillet9_piece_1 = extrude(amount=40.625, mode=Mode.PRIVATE)
    fillet9_piece_1 = fillet9_piece_1 - Plane(origin=(-26.99513388, -256.446444019, 35), x_dir=(0, 0, 1), z_dir=(0, 1, 0)) * Cylinder(6.25, 107, mode=Mode.PRIVATE)
    add(fillet9_piece_1, mode=Mode.SUBTRACT)
    with BuildSketch(Plane(origin=(-33.24513388, -255, 34.999999912), x_dir=(0, -1, 0), z_dir=(0, 0, 1))) as fillet9_piece_2_section:
        with BuildLine():
            CenterArc((FILLET9_R, FILLET9_R), FILLET9_R, 180, 90)
            Line((0, FILLET9_R), (0, 0))
            Line((0, 0), (FILLET9_R, 0))
        make_face()
    fillet9_piece_2 = extrude(amount=40.625000088, mode=Mode.PRIVATE)
    fillet9_piece_2 = fillet9_piece_2 - Plane(origin=(-26.99513388, -256.446444017, 35), x_dir=(0, 0, 1), z_dir=(0, 1, 0)) * Cylinder(6.25, 107, mode=Mode.PRIVATE)
    add(fillet9_piece_2, mode=Mode.SUBTRACT)
    with BuildSketch(Plane(origin=(-20.74513388, -255, -5.625), x_dir=(-1, 0, 0), z_dir=(0, 0, 1))) as fillet9_piece_3_section:
        with BuildLine():
            CenterArc((FILLET9_R, FILLET9_R), FILLET9_R, 180, 90)
            Line((0, FILLET9_R), (0, 0))
            Line((0, 0), (FILLET9_R, 0))
        make_face()
    fillet9_piece_3 = extrude(amount=40.625, mode=Mode.PRIVATE)
    fillet9_piece_3 = fillet9_piece_3 - Plane(origin=(-26.99513388, -256.446444019, 35), x_dir=(0, 0, 1), z_dir=(0, 1, 0)) * Cylinder(6.25, 107, mode=Mode.PRIVATE)
    add(fillet9_piece_3, mode=Mode.SUBTRACT)
    with BuildSketch(Plane(origin=(-33.24513388, -255, -5.625), x_dir=(0, -1, 0), z_dir=(0, 0, 1))) as fillet9_piece_4_section:
        with BuildLine():
            CenterArc((FILLET9_R, FILLET9_R), FILLET9_R, 180, 90)
            Line((0, FILLET9_R), (0, 0))
            Line((0, 0), (FILLET9_R, 0))
        make_face()
    fillet9_piece_4 = extrude(amount=40.624999912, mode=Mode.PRIVATE)
    fillet9_piece_4 = fillet9_piece_4 - Plane(origin=(-26.99513388, -256.446444019, 35), x_dir=(0, 0, 1), z_dir=(0, 1, 0)) * Cylinder(6.25, 107, mode=Mode.PRIVATE)
    add(fillet9_piece_4, mode=Mode.SUBTRACT)

    # Sketch30 → Cut-Extrude15 (cut)
    with BuildSketch(Plane(origin=(0, 0, 10), x_dir=(-1, 0, 0), z_dir=(0, 0, -1))):
        with Locations((26.442215429, -267.57880534)):
            Rectangle(SKETCH30_W, SKETCH30_H)
    extrude(amount=-CUT_EXTRUDE15_DEPTH, mode=Mode.SUBTRACT)

    # Sketch31 → Boss-Extrude16 (add, two sides: drawn at the far end of the back side and taken through both)
    with BuildSketch(Plane.XZ.offset(252.017392171).offset(-BOSS_EXTRUDE16_DEPTH_BACK)):
        with Locations(Location((-26.99513388, 35, 0), (0, 0, 90))):
            Circle(SKETCH31_R)
    extrude(amount=BOSS_EXTRUDE16_DEPTH + BOSS_EXTRUDE16_DEPTH_BACK)

    # Sketch32 → Cut-Extrude16 (cut)
    with BuildSketch(Plane(origin=(0, -260.017392171, 0), x_dir=(-1, 0, 0), z_dir=(0, -1, 0))):
        with Locations(Location((26.99513388, -35, 0), (0, 0, 90))):
            Circle(SKETCH32_R)
    extrude(amount=-CUT_EXTRUDE16_DEPTH, mode=Mode.SUBTRACT)

    # Sketch33 → Boss-Extrude17 (add)
    with BuildSketch(Plane.XZ.offset(240.017392171)):
        with Locations(Location((-26.99513388, 35, 0), (0, 0, 270))):
            Circle(SKETCH33_R)
    extrude(amount=BOSS_EXTRUDE17_DEPTH)


solid = part.part
